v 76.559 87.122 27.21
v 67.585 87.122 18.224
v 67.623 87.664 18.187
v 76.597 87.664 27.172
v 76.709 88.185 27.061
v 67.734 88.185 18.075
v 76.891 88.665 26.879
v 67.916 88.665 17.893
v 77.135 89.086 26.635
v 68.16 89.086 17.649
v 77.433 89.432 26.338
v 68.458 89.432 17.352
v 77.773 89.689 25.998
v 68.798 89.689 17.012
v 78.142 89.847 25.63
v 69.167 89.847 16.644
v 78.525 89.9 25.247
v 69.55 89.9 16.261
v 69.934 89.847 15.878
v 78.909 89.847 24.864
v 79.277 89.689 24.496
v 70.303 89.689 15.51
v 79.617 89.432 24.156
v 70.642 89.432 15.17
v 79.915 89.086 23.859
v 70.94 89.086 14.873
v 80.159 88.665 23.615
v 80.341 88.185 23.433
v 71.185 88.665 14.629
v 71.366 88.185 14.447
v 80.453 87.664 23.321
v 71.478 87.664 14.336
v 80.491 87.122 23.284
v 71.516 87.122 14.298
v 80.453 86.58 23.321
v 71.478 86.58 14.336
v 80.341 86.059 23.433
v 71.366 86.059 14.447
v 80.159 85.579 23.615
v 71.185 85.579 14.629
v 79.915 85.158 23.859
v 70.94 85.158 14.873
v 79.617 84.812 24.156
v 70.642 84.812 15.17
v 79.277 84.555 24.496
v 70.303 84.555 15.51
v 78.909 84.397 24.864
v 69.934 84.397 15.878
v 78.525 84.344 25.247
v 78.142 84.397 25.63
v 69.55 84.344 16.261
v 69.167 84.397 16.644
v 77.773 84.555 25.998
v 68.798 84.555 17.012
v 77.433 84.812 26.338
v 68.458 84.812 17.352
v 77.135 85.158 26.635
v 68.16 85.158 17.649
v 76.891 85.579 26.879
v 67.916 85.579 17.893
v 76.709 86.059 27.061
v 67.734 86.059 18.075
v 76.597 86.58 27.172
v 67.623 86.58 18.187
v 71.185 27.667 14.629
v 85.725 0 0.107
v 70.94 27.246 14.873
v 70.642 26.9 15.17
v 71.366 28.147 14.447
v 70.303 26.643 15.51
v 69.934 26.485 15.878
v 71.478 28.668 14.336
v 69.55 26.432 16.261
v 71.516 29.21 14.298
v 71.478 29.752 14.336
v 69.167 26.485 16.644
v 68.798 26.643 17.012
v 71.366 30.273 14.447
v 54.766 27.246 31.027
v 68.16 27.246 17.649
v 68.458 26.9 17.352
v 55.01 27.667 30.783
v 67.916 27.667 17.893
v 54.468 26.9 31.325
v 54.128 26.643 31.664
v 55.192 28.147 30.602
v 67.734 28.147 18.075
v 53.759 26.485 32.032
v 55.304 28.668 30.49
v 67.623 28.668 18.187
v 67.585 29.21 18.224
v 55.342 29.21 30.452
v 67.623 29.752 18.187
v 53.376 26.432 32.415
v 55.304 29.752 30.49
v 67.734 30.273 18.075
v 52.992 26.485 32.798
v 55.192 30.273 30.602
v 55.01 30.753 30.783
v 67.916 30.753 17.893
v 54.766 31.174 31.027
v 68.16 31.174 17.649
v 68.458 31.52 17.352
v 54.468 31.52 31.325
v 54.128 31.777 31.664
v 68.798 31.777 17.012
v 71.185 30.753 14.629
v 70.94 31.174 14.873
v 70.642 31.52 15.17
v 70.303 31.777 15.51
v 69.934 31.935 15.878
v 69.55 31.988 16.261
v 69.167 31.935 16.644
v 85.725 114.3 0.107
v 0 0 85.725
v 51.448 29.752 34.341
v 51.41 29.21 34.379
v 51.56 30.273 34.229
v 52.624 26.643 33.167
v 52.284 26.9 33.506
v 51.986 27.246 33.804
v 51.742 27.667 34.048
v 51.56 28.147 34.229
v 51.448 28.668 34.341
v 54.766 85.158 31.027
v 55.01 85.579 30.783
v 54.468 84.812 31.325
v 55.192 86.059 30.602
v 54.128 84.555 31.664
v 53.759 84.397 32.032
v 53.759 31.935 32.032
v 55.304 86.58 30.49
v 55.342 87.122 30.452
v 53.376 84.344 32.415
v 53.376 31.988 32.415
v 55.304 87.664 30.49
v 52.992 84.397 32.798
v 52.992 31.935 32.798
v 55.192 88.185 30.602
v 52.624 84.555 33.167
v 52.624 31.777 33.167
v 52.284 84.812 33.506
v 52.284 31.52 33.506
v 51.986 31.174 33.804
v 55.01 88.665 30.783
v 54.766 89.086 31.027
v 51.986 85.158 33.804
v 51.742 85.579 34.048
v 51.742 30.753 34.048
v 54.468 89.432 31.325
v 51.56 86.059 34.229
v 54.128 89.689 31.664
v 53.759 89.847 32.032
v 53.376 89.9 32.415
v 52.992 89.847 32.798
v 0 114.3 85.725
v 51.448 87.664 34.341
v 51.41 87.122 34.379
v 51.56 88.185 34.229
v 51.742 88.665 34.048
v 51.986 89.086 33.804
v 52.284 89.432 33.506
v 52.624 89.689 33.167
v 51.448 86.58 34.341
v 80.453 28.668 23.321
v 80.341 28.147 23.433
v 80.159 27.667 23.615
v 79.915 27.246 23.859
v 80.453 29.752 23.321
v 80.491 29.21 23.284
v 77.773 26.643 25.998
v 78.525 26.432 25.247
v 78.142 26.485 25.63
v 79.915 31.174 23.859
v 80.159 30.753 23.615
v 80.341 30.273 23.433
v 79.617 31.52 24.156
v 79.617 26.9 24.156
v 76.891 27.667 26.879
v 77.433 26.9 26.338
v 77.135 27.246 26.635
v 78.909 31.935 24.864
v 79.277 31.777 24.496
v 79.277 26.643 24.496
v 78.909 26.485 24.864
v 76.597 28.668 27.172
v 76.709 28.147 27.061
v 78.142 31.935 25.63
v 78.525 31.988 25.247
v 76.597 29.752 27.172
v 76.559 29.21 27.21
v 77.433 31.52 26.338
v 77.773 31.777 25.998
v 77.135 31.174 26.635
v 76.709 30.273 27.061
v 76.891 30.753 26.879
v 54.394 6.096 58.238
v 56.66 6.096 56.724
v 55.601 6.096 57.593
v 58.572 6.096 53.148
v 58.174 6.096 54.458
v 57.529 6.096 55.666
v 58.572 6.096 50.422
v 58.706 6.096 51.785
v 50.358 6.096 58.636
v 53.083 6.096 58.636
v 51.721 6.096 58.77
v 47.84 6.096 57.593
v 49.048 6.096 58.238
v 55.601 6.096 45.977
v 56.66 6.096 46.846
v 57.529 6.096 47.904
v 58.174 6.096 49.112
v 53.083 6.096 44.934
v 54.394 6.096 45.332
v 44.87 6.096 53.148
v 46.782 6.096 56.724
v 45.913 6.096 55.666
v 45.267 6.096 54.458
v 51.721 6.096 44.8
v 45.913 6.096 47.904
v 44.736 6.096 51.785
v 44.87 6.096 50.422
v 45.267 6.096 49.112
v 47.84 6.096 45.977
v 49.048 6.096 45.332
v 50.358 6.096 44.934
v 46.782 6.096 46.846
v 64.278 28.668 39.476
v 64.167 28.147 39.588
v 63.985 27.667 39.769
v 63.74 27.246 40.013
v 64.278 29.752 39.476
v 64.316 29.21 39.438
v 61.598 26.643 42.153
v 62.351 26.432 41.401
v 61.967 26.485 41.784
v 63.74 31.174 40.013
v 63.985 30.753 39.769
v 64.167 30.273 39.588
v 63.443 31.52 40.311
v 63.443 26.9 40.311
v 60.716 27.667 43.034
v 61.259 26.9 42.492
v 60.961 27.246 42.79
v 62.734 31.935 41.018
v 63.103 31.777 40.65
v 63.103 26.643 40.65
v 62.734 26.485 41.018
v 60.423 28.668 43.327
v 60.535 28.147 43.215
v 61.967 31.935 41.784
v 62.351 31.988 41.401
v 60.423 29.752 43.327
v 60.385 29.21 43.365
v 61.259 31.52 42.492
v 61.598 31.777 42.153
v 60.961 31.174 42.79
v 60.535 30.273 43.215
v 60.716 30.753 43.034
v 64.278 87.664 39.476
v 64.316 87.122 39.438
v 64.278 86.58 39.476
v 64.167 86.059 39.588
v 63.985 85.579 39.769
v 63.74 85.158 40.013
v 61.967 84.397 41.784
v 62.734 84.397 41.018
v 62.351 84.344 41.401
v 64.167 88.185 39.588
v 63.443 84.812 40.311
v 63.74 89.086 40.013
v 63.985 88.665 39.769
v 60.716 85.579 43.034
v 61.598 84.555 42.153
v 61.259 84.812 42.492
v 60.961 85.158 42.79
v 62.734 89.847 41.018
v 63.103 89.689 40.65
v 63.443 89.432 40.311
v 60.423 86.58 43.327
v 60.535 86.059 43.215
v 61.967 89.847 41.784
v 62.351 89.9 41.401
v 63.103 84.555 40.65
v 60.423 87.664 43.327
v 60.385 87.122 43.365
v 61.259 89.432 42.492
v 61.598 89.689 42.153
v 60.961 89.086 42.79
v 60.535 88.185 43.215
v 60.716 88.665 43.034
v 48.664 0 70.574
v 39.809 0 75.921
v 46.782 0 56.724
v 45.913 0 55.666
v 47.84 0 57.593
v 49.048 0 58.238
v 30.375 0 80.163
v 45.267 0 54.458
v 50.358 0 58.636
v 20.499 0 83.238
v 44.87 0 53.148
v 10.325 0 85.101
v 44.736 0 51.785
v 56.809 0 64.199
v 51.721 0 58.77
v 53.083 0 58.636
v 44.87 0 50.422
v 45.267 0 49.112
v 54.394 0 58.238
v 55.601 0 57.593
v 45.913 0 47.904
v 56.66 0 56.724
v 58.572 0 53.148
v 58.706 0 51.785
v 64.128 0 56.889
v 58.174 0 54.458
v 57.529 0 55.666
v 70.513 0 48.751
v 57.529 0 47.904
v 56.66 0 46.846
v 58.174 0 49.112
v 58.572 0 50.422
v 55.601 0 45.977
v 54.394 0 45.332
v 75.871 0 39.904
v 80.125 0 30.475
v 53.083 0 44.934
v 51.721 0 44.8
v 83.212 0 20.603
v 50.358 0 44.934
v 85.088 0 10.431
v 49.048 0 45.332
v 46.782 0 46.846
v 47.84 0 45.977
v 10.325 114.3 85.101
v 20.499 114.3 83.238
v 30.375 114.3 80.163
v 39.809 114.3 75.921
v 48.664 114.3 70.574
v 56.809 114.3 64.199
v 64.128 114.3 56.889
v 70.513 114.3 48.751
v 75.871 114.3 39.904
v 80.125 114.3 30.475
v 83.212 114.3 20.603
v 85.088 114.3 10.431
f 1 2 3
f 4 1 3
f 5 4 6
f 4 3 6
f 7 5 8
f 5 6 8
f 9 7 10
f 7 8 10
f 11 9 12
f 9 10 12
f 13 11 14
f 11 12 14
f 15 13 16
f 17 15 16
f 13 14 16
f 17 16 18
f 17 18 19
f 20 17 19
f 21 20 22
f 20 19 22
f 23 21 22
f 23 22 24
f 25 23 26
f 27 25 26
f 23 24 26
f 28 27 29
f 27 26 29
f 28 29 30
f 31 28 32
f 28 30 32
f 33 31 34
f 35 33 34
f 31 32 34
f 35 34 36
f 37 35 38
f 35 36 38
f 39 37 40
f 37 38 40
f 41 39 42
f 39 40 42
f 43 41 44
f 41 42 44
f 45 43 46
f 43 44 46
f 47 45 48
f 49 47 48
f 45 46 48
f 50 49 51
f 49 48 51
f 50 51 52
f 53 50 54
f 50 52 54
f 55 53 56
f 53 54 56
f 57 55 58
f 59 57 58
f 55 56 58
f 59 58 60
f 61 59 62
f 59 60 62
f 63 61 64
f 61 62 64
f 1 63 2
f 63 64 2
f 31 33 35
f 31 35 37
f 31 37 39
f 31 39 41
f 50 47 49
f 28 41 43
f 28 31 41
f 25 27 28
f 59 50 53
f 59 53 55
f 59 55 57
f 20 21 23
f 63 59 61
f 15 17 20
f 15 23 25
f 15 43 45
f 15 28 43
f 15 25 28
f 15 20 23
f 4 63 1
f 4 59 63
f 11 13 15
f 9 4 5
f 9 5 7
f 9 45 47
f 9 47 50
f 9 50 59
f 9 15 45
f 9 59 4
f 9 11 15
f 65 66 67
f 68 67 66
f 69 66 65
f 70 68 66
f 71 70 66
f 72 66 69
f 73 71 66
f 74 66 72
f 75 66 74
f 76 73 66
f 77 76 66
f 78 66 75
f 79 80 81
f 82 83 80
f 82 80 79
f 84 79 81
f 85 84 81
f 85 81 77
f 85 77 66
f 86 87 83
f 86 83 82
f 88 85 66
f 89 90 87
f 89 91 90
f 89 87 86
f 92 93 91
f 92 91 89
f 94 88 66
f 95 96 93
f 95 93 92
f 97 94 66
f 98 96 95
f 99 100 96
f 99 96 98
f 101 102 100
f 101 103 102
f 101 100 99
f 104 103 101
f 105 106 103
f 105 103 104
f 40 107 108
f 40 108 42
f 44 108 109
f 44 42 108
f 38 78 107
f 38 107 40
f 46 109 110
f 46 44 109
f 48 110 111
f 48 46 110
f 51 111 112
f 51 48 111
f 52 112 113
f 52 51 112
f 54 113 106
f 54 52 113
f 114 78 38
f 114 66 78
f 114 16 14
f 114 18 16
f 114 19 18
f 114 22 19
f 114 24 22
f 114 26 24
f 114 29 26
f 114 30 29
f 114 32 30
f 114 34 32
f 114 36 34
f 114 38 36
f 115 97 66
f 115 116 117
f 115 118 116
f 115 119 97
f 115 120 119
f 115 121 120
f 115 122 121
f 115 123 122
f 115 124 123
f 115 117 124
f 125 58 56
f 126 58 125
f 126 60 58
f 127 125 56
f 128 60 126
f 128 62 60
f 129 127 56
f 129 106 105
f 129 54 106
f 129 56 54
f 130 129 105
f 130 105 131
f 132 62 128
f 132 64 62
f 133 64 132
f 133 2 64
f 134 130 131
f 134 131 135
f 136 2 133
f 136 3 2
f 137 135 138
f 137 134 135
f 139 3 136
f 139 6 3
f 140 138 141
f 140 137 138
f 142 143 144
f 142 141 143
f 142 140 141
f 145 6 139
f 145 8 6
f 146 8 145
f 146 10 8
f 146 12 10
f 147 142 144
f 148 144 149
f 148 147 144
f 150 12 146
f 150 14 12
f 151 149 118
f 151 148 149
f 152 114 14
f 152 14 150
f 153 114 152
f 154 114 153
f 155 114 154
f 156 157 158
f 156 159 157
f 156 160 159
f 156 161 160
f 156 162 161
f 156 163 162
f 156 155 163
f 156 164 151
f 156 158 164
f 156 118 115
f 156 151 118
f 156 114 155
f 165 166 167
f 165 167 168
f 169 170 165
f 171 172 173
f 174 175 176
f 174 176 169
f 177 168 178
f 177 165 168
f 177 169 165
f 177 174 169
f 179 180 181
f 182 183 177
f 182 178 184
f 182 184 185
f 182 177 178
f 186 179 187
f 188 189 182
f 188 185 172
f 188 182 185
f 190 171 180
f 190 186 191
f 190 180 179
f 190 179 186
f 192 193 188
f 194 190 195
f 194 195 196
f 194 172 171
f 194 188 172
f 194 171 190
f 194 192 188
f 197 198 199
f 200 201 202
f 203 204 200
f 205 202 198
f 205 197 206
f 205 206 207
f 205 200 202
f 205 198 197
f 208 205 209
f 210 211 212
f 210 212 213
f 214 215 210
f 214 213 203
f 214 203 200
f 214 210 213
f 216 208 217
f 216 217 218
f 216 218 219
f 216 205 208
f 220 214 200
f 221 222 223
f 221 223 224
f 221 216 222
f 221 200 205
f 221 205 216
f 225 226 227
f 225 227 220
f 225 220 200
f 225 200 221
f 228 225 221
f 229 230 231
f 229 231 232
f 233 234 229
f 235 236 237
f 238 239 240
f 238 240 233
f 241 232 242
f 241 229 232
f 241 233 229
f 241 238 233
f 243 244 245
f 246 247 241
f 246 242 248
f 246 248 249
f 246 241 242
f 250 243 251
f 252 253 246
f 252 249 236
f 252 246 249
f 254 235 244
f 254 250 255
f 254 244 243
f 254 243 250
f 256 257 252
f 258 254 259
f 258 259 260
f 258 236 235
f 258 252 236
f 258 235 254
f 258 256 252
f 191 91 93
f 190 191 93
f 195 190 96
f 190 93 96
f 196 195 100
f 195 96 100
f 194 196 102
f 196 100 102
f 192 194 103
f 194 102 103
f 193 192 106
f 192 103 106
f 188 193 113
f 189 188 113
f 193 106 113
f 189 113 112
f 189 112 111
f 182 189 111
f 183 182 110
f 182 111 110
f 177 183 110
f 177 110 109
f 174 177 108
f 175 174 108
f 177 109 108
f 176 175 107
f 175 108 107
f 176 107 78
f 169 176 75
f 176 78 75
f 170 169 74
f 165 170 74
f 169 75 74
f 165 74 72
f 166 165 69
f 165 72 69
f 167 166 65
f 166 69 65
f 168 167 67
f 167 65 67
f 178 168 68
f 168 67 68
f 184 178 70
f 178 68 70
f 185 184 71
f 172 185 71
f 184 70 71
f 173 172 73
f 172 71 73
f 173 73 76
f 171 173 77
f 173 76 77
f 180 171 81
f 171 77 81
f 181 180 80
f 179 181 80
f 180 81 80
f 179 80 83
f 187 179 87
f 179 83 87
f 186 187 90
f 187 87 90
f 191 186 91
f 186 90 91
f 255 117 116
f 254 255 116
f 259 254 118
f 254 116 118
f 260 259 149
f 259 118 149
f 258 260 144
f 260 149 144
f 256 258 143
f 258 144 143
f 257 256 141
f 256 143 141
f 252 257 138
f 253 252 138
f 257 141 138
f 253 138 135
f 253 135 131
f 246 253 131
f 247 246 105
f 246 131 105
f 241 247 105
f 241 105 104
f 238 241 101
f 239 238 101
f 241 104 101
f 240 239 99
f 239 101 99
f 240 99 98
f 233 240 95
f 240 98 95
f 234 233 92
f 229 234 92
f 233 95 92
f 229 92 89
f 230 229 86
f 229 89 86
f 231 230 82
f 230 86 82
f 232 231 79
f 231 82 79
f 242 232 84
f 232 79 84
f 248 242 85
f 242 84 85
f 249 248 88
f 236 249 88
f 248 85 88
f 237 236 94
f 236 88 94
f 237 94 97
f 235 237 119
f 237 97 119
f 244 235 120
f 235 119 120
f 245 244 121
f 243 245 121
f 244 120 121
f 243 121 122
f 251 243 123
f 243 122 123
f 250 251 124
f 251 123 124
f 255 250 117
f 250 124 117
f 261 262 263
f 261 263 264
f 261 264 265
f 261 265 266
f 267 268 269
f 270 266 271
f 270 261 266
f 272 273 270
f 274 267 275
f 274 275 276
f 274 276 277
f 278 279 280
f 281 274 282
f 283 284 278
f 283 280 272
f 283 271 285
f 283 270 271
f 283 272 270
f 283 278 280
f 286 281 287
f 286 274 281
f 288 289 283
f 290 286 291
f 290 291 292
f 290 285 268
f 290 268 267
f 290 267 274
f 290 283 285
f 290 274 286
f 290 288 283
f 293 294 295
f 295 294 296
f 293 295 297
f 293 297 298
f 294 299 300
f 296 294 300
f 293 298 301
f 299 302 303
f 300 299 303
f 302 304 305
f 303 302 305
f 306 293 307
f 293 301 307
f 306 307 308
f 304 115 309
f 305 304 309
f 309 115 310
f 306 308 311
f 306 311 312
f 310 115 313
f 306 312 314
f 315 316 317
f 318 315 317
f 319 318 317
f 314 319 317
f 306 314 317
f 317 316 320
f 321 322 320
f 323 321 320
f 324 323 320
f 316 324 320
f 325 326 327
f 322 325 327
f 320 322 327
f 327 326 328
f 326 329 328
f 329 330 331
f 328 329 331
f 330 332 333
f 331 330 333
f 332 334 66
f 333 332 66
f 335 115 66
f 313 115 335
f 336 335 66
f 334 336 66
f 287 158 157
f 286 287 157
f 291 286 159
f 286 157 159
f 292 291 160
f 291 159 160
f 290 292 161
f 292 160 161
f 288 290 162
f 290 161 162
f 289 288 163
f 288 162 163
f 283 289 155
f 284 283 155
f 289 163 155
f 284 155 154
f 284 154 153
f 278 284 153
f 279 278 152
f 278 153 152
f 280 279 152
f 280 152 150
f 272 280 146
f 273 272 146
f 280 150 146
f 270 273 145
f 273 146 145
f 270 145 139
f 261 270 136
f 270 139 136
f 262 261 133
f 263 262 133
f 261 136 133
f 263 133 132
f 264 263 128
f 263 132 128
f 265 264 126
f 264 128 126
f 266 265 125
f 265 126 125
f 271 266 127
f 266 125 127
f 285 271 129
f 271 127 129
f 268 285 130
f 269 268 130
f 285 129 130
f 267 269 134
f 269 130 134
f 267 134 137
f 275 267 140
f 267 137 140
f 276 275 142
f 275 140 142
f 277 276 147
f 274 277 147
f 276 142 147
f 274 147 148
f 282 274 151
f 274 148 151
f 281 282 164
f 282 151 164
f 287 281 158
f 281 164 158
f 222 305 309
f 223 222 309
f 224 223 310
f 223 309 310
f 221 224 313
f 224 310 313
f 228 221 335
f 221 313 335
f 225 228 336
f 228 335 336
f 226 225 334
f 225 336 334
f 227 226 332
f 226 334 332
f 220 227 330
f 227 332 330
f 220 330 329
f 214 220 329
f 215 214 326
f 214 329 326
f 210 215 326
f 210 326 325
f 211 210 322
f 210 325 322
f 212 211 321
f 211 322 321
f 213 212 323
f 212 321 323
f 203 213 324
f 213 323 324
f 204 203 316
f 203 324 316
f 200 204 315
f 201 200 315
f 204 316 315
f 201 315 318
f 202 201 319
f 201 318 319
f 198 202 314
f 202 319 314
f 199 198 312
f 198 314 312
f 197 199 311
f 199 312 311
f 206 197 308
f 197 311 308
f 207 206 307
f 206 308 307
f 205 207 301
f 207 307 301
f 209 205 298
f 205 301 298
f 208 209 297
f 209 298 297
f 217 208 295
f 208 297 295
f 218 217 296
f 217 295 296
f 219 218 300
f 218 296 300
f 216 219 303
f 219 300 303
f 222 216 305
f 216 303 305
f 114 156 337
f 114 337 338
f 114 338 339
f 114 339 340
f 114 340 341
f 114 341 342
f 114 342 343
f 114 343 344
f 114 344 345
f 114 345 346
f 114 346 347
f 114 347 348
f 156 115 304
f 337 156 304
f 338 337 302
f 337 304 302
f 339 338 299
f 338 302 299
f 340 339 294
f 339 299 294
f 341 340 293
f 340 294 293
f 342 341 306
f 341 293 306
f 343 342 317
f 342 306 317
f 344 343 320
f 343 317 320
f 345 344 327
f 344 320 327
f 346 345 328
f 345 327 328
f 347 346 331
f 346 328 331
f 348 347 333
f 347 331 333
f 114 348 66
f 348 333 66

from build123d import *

# Parameters (mm, degrees)
SKETCH1_R           = 85.725
BOSS_EXTRUDE1_DEPTH = 114.3
CUT_EXTRUDE1_DEPTH  = 152.4
SKETCH3_R           = 2.778125
CUT_EXTRUDE2_DEPTH  = 12.7
SKETCH4_R           = 6.985
CUT_EXTRUDE3_DEPTH  = 6.096


with BuildPart() as part:
    # Sketch1 → Boss-Extrude1 (new body)
    with BuildSketch(Plane(origin=(0, 0, 0), x_dir=(1, 0, 0), z_dir=(0, 1, 0))):
        Circle(SKETCH1_R)
    extrude(amount=BOSS_EXTRUDE1_DEPTH)

    # Sketch2 → Cut-Extrude1 (cut)
    with BuildSketch(Plane(origin=(0, 114.3, 0), x_dir=(1, 0, 0), z_dir=(0, 1, 0))):
        Polygon((85.724933621, -0.10668), (0, -85.725), (-45.627504124, -96.719379999), (-137.428949547, 46.173941299), (19.12530113, 101.910533163), (109.833872203, 30.600481808), align=None)
    extrude(amount=-CUT_EXTRUDE1_DEPTH, mode=Mode.SUBTRACT)

    # Sketch3 → Cut-Extrude2 (cut)
    with BuildSketch(Plane(origin=(42.862466811, 0, 42.91584), x_dir=(-0.707546622, 0, 0.706666667), z_dir=(-0.706666667, 0, -0.707546622))):
        with Locations((-37.719, 87.122)):
            Circle(SKETCH3_R)
        with Locations((-14.859, 87.122)):
            Circle(SKETCH3_R)
        with Locations((-37.719, 29.21)):
            Circle(SKETCH3_R)
        with Locations((-14.859, 29.21)):
            Circle(SKETCH3_R)
    extrude(amount=-CUT_EXTRUDE2_DEPTH, mode=Mode.SUBTRACT)

    # Sketch4 → Cut-Extrude3 (cut)
    with BuildSketch(Plane(origin=(0, 0, 0), x_dir=(-1, 0, 0), z_dir=(0, -1, 0))):
        with Locations((-51.720733405, -51.785137083)):
            Circle(SKETCH4_R)
    extrude(amount=-CUT_EXTRUDE3_DEPTH, mode=Mode.SUBTRACT)


solid = part.part
